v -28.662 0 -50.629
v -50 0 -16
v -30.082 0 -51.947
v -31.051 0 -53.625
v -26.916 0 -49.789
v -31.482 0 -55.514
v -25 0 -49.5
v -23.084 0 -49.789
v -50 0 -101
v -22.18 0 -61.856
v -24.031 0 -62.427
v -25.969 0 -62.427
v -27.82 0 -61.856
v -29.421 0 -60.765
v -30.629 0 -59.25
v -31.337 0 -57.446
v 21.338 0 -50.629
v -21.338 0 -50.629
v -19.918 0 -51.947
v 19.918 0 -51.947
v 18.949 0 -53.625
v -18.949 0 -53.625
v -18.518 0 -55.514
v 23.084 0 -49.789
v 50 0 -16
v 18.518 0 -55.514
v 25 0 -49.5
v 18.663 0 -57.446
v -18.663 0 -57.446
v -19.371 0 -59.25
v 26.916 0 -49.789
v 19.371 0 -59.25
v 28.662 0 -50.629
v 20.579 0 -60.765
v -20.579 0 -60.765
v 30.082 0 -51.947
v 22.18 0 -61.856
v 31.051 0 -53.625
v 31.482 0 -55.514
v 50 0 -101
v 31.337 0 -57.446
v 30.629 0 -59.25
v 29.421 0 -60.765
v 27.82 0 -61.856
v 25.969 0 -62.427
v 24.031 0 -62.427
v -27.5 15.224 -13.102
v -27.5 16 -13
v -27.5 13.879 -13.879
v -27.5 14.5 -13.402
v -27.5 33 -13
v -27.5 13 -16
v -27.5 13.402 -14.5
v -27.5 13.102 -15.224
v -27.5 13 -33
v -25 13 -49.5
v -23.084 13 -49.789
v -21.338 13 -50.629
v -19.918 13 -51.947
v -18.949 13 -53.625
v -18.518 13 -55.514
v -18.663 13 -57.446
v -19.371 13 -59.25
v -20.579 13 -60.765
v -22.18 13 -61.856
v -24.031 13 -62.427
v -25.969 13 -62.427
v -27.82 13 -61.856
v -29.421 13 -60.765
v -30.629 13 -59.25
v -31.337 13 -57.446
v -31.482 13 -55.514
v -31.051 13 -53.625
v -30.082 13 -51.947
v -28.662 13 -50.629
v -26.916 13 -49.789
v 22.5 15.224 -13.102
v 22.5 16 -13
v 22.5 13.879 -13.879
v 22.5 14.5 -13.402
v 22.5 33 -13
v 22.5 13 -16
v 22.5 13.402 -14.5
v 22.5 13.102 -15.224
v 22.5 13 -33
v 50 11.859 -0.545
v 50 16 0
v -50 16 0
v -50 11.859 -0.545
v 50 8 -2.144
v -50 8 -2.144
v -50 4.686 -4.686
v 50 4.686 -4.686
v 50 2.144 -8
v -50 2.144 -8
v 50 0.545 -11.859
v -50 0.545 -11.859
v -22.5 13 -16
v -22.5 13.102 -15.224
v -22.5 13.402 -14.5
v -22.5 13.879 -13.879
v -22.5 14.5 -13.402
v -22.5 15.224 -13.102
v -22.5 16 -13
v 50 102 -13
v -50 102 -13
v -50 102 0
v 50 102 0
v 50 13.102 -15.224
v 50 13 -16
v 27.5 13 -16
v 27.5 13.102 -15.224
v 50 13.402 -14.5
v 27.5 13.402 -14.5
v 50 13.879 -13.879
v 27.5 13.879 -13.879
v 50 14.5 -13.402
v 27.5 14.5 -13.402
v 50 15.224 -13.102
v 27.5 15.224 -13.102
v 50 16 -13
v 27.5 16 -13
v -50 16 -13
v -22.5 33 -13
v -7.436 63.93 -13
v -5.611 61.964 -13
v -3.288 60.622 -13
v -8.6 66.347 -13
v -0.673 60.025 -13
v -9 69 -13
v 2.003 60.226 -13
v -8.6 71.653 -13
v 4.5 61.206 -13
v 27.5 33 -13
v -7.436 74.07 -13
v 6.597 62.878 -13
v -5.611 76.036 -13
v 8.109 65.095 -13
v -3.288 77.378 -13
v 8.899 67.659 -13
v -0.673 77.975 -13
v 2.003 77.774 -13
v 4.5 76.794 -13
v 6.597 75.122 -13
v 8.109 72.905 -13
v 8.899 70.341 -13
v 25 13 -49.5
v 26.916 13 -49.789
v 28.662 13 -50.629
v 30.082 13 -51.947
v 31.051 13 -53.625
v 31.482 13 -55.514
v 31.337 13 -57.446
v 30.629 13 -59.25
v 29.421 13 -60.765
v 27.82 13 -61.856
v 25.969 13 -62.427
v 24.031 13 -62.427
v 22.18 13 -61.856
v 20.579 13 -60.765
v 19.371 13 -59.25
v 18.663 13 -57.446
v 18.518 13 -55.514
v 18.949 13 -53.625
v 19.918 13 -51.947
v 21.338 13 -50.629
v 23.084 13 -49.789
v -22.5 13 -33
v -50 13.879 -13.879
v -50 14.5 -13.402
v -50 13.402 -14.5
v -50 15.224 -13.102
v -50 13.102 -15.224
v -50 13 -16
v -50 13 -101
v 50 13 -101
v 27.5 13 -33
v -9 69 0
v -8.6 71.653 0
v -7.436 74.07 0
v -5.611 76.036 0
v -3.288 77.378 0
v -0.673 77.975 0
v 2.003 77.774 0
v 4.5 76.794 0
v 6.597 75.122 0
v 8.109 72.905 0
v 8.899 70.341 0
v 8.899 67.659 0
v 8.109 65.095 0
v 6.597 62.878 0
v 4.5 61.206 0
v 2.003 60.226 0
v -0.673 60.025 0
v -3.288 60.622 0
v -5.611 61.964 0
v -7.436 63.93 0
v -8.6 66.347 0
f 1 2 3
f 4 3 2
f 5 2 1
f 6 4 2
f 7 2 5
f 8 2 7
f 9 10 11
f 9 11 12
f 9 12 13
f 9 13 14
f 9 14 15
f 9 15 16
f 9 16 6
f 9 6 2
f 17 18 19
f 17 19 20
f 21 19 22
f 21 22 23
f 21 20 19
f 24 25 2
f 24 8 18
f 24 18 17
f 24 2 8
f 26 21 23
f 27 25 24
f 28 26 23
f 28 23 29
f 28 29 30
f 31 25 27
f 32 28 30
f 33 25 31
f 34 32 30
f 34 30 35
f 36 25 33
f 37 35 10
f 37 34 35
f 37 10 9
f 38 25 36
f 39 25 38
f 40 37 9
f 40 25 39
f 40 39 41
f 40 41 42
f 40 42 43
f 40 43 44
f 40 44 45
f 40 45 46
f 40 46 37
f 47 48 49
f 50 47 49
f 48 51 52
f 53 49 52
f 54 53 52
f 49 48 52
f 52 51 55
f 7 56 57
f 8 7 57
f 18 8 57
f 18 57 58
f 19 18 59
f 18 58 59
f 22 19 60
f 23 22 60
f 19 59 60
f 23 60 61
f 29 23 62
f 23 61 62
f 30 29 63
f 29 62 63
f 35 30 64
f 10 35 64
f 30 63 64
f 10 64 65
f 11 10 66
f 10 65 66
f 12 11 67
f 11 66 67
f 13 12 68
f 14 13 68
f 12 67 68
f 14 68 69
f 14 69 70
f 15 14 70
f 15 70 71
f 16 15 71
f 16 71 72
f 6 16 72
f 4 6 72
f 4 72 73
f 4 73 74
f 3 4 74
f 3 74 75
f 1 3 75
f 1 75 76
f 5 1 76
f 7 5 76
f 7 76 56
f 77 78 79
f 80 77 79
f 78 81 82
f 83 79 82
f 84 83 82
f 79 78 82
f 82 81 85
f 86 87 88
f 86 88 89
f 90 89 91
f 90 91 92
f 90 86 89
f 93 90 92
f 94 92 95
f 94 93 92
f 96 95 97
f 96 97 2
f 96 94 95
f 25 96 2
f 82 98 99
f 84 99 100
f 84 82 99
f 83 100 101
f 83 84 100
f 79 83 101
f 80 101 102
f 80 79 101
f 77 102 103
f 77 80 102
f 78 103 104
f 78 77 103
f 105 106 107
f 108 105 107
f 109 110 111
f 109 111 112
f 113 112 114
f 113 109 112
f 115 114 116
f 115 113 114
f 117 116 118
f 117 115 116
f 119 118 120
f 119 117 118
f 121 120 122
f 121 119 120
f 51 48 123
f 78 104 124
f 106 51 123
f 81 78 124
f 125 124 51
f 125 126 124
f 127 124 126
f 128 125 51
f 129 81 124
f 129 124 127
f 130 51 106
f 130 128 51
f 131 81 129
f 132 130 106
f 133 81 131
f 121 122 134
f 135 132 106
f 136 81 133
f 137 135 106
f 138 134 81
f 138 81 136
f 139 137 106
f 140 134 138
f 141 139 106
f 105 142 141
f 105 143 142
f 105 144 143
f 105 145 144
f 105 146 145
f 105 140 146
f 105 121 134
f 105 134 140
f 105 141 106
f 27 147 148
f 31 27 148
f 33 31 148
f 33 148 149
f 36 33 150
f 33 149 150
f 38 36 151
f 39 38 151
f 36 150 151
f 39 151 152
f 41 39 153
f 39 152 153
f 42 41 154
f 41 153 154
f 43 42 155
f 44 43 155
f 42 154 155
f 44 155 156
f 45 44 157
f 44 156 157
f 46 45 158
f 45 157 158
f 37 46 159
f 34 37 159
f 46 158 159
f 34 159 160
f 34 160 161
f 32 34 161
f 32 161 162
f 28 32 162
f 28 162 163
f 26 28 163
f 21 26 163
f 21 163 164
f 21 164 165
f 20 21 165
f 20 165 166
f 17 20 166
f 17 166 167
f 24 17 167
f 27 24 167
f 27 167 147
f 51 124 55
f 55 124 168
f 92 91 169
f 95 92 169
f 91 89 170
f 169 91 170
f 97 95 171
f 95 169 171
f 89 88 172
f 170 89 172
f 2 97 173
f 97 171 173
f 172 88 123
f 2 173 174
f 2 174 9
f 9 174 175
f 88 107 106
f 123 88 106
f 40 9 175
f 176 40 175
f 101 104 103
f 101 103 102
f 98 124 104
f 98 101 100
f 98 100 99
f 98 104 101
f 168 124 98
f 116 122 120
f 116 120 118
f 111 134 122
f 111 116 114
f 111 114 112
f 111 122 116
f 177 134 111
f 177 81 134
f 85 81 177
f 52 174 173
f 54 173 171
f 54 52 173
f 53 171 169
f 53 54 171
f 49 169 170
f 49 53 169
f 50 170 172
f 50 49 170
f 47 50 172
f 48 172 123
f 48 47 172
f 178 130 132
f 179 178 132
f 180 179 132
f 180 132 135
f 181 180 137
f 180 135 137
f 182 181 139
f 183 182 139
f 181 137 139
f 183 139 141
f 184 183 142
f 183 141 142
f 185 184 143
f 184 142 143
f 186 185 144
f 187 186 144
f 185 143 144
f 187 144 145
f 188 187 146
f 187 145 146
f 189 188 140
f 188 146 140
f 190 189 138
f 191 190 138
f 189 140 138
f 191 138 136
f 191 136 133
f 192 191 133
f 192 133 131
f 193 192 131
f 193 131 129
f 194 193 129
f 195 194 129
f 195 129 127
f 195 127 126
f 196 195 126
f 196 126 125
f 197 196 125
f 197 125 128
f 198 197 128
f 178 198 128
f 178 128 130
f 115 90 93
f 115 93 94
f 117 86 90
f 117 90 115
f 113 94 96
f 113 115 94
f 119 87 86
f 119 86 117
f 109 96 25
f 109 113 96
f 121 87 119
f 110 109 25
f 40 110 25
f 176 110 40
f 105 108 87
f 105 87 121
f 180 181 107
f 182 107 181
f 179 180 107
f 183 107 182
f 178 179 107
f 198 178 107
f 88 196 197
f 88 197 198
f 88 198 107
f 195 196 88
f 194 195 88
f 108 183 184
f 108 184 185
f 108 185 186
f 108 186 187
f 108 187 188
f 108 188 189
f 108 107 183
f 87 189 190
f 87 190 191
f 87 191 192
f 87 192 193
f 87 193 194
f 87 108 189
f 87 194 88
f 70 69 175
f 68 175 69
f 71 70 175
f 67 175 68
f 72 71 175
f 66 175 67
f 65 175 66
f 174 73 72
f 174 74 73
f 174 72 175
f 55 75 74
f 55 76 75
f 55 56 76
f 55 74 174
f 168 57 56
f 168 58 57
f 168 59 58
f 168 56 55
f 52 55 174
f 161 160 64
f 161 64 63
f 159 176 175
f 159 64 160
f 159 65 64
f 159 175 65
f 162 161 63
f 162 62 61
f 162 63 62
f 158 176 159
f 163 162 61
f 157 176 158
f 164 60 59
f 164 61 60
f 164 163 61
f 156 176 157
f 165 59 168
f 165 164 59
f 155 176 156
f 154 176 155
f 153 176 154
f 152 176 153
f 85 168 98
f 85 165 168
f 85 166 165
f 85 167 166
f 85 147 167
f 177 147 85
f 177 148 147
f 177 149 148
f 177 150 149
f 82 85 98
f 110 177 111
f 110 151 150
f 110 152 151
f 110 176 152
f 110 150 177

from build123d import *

# Parameters (mm, degrees)
ESTRUSIONE_SOTTILE1_DEPTH = 50
SCHIZZO4_R                = 6.5
TAGLIO_ESTRUSIONE1_DEPTH  = 144.603621124
SCHIZZO5_R                = 9
TAGLIO_ESTRUSIONE2_DEPTH  = 144.694119573
NERVATURA2_REACH          = 163.957
SCHIZZO6_WALL_W           = 354.197839966
SCHIZZO6_WALL_H           = 5


with BuildPart() as part:
    # Schizzo2 → Estrusione-Sottile1 (new, symmetric)
    with BuildSketch(Plane(origin=(0, 0, 0), x_dir=(0, 0, -1), z_dir=(1, 0, 0))):
        with BuildLine():
            Line((0, 102), (0, 16))
            ThreePointArc((0, 16), (4.686291501, 4.686291501), (16, 0))
            Line((16, 0), (101, 0))
            Line((101, 0), (101, 13))
            Line((101, 13), (16, 13))
            ThreePointArc((16, 13), (13.878679656, 13.878679656), (13, 16))
            Line((13, 16), (13, 102))
            Line((13, 102), (0, 102))
        make_face()
    extrude(amount=ESTRUSIONE_SOTTILE1_DEPTH, both=True)

    # Schizzo4 → Taglio-Estrusione1 (cut, through all)
    with BuildSketch(Plane(origin=(0, 13, 0), x_dir=(1, 0, 0), z_dir=(0, 1, 0))):
        with Locations(Location((-25, 56, 0), (0, 0, 270))):
            Circle(SCHIZZO4_R)
        with Locations(Location((25, 56, 0), (0, 0, 270))):
            Circle(SCHIZZO4_R)
    extrude(amount=-TAGLIO_ESTRUSIONE1_DEPTH, mode=Mode.SUBTRACT)

    # Schizzo5 → Taglio-Estrusione2 (cut, through all)
    with BuildSketch(Plane(origin=(0, 0, -13), x_dir=(-1, 0, 0), z_dir=(0, 0, -1))):
        with Locations((0, 69)):
            Circle(SCHIZZO5_R)
    extrude(amount=-TAGLIO_ESTRUSIONE2_DEPTH, mode=Mode.SUBTRACT)

    # Schizzo6 wall → Nervatura2 (add, up to next)
    with BuildSketch(Plane(origin=(25, 23, -23), x_dir=(0, -0.707106781187, -0.707106781187), z_dir=(0, 0.707106781187, -0.707106781187)), mode=Mode.PRIVATE) as nervatura2_sk1:
        Rectangle(SCHIZZO6_WALL_W, SCHIZZO6_WALL_H)
    nervatura2_tool1 = extrude(nervatura2_sk1.sketch, amount=-NERVATURA2_REACH, mode=Mode.PRIVATE) - part.part
    nervatura2 = nervatura2_tool1.solids().sort_by_distance((25, 23, -23))[0]
    add(nervatura2)

    # Specchia1: Nervatura2 across plane
    add(nervatura2.mirror(Plane(origin=(0, 0, 0), x_dir=(0, 0, 1), z_dir=(1, 0, 0))))


solid = part.part
